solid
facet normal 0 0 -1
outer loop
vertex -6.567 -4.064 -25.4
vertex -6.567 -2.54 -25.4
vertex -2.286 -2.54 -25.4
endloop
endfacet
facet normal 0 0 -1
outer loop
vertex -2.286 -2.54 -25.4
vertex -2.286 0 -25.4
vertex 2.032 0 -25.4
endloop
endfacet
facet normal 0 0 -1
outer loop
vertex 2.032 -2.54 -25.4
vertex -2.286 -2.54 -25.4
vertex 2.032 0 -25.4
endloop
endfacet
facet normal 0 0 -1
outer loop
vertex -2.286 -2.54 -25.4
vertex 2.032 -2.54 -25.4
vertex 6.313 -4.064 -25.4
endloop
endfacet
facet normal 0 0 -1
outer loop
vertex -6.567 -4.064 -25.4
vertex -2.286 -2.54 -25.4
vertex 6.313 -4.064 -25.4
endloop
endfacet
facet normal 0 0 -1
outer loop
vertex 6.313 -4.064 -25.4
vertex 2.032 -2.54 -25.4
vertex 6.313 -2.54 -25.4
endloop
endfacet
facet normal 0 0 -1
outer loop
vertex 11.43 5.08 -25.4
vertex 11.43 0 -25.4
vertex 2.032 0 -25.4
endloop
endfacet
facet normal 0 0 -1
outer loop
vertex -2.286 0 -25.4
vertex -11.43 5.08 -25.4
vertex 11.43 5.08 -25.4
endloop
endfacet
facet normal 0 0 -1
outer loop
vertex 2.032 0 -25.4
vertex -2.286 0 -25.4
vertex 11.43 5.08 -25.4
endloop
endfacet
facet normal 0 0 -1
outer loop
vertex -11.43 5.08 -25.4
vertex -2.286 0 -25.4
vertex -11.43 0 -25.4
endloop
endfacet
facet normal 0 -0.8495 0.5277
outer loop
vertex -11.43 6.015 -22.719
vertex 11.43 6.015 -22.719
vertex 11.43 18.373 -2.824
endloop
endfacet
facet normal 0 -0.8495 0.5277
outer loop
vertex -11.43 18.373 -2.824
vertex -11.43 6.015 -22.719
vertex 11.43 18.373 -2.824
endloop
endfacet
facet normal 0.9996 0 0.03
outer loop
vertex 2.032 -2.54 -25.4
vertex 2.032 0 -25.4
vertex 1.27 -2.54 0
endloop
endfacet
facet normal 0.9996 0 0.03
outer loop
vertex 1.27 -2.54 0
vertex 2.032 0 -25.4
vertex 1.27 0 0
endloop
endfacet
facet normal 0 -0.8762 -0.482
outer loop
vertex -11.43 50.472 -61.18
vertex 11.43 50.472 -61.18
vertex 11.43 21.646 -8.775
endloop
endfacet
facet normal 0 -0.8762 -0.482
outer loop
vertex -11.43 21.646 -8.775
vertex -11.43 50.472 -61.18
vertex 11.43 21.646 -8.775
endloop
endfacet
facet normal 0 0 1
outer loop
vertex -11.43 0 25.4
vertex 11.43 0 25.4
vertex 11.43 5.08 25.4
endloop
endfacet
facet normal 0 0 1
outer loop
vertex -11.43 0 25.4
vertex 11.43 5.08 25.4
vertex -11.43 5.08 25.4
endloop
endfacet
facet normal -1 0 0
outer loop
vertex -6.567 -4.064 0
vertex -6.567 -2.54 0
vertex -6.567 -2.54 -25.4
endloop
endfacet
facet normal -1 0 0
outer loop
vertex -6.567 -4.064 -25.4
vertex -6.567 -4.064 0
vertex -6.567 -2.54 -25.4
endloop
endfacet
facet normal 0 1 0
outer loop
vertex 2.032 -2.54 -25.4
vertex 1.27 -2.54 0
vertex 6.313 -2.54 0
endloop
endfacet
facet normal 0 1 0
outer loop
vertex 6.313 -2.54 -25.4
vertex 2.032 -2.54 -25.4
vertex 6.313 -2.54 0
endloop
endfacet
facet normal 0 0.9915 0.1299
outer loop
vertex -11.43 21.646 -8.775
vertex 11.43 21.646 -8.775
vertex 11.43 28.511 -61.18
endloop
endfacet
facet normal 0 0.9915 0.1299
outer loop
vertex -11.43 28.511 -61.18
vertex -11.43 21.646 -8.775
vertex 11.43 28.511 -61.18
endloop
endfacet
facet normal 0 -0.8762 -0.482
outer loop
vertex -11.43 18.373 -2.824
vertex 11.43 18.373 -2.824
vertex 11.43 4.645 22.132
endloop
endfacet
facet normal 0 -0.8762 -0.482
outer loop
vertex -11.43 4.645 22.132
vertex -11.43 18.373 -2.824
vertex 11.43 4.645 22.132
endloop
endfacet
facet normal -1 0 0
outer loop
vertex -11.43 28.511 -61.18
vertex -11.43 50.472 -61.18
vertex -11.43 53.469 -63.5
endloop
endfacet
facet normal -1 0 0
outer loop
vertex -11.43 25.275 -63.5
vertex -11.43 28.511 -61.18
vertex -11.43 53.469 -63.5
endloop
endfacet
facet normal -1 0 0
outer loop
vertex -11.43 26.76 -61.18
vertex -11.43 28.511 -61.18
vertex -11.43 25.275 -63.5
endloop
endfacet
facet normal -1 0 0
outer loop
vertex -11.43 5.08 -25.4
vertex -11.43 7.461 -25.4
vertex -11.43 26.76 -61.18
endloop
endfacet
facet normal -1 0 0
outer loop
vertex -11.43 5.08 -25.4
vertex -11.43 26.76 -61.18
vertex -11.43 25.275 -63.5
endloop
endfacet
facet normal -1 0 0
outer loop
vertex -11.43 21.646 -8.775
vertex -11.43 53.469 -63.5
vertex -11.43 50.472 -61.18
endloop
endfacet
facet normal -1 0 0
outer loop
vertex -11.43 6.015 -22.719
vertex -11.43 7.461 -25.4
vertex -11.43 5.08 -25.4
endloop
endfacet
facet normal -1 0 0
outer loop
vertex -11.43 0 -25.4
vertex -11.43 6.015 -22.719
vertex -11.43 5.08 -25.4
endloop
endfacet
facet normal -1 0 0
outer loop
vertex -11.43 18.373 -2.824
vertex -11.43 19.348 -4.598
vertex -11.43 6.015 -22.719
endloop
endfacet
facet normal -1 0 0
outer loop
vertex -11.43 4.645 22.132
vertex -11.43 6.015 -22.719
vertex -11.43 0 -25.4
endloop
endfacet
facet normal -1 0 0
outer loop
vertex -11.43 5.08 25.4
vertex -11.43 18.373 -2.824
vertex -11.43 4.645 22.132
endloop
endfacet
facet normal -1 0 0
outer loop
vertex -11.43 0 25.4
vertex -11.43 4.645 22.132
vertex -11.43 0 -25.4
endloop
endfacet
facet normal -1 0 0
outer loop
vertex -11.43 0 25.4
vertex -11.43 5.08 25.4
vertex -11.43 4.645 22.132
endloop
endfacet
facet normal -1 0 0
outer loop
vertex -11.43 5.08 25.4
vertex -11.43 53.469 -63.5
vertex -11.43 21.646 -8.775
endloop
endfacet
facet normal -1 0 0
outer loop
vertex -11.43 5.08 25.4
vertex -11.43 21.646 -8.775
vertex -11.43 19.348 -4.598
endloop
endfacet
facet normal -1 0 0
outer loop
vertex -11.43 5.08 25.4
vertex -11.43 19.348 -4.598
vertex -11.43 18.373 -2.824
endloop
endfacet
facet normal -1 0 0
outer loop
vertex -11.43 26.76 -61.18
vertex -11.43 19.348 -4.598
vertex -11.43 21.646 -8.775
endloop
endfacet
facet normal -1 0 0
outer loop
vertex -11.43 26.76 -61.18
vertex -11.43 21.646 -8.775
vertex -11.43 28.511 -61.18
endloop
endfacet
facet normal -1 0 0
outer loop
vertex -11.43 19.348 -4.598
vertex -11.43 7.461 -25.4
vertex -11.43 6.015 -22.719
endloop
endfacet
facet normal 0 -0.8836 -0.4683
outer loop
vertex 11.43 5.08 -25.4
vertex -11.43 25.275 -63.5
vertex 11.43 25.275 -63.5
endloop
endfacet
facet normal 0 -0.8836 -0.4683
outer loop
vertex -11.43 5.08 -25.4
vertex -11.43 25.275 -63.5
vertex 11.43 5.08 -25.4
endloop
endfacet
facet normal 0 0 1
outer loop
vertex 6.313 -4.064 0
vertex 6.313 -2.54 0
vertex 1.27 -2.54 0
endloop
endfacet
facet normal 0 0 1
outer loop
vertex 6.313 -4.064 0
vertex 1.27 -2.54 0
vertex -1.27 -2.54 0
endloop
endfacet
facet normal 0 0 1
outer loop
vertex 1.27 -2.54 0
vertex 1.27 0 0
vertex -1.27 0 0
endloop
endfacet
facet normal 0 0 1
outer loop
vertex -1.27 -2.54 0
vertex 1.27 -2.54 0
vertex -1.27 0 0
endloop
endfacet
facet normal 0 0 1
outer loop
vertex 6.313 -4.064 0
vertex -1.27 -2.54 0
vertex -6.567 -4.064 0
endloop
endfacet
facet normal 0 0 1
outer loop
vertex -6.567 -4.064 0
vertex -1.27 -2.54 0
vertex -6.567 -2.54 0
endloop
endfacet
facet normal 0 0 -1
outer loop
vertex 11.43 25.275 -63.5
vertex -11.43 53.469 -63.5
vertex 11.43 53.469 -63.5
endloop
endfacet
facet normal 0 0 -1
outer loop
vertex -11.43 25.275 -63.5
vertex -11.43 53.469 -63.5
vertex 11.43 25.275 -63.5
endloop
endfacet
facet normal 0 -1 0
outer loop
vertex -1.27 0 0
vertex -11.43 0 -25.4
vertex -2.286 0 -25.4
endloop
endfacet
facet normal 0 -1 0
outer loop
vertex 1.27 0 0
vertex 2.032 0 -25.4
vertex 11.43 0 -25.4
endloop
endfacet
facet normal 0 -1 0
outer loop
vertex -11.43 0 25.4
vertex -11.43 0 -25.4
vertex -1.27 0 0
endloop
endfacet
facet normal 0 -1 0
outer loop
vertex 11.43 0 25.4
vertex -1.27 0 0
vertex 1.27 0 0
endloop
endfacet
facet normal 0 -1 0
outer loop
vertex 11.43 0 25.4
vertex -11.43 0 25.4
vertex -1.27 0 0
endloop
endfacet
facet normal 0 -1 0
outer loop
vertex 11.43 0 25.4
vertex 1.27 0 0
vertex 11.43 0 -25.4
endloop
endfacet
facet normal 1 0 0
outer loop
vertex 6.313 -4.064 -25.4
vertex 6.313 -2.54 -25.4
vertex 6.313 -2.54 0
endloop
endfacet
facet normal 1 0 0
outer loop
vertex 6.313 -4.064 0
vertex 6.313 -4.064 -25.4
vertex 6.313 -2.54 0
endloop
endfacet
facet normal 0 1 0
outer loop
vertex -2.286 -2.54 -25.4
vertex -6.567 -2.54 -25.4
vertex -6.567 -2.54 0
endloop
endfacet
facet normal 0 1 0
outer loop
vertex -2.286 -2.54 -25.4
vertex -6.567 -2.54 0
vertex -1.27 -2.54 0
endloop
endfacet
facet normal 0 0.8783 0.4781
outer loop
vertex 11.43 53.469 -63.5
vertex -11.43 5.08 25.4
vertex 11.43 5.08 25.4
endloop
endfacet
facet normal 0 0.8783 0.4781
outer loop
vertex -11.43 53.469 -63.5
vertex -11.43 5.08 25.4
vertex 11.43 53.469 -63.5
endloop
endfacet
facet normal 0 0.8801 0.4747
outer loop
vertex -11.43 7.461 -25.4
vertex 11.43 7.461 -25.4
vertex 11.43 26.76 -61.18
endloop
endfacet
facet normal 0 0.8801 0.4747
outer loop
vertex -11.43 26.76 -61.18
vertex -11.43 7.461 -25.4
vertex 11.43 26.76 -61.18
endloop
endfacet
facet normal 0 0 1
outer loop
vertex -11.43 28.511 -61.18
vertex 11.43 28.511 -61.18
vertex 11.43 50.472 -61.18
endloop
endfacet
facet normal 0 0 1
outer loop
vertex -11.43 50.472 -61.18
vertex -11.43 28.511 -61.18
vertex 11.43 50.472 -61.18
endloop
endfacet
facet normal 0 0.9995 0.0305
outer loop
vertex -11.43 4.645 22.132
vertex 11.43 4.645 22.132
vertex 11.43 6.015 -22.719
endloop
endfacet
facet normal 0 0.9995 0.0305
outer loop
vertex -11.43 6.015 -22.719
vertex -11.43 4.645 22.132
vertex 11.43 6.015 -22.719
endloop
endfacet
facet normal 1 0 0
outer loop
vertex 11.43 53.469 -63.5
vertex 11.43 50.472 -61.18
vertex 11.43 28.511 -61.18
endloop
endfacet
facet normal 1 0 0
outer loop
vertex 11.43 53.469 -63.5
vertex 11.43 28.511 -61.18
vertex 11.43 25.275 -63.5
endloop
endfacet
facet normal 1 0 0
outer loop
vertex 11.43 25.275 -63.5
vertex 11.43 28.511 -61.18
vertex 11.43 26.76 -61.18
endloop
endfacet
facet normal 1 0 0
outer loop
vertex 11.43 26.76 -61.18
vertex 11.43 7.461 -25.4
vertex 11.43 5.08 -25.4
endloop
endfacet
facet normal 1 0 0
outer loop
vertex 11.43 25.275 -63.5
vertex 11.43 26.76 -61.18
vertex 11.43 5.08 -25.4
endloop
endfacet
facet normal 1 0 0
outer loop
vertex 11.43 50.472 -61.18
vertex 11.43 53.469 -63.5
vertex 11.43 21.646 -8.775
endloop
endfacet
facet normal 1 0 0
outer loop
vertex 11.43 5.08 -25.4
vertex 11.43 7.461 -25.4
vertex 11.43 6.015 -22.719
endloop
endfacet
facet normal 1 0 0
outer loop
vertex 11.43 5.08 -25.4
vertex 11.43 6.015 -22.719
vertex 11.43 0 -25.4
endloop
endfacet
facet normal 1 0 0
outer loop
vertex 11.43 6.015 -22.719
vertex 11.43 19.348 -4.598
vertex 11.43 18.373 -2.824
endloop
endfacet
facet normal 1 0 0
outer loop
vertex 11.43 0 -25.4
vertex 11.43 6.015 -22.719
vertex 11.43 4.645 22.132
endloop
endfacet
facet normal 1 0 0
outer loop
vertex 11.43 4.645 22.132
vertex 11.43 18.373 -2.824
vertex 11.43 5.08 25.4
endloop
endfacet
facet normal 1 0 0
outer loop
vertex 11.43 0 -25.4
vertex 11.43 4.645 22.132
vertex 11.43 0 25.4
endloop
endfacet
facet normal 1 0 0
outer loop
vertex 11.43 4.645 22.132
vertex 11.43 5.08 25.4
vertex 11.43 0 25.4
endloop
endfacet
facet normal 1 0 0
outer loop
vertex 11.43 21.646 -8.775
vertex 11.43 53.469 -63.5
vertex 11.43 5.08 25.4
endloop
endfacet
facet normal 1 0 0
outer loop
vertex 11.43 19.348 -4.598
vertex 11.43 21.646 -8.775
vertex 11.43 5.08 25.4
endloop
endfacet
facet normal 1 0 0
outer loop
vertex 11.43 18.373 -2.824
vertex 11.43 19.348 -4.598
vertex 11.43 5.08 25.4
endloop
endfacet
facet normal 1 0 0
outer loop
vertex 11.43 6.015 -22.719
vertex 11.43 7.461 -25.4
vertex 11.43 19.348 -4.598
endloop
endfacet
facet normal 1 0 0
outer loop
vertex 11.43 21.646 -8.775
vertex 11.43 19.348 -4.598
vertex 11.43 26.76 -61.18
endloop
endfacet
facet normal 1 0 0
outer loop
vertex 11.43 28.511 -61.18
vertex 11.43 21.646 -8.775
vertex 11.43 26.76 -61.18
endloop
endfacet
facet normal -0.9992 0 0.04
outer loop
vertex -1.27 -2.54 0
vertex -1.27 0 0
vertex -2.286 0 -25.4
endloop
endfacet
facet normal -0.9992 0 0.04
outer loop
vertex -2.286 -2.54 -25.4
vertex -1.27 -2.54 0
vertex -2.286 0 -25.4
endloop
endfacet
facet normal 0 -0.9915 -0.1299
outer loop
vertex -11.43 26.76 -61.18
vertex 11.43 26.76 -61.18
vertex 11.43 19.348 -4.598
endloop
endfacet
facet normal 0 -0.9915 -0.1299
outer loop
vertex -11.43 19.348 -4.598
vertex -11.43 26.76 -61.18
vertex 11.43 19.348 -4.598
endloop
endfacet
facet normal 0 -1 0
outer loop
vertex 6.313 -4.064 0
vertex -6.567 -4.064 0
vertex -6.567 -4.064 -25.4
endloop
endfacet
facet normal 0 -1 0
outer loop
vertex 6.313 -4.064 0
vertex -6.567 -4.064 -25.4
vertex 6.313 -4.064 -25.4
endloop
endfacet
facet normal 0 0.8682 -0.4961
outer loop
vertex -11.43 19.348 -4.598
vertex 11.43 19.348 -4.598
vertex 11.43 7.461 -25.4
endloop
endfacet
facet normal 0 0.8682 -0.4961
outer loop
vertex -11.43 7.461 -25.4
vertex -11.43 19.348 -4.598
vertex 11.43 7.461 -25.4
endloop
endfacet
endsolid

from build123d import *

# Parameters (mm, degrees)
F1_DEPTH = 5.08
F2_DEPTH = 2.54
F4_DEPTH = 1.524
F6_DEPTH = 22.86
F8_DEPTH = 25.4


with BuildPart() as f1:
    # F0 (on Front) → F1 (new body)
    with BuildSketch(Plane.XZ):
        Polygon((11.43, 25.4), (-11.43, 25.4), (-11.43, -25.4), (-6.35, -25.4), (-6.35, 0), (-1.27, 0), (1.27, 0), (6.35, 0), (6.35, -25.4), (11.43, -25.4), align=None)
        Polygon((-6.35, 0), (-6.35, -25.4), (-2.286, -25.4), (-1.27, 0), align=None)
        Polygon((-1.27, 0), (-2.286, -25.4), (2.032, -25.4), (1.27, 0), align=None)
        Polygon((2.032, -25.4), (6.35, -25.4), (6.35, 0), (1.27, 0), align=None)
    extrude(amount=-F1_DEPTH)

    # F0 (on Front) → F2 (join)
    with BuildSketch(Plane.XZ):
        Polygon((-1.27, 0), (-2.286, -25.4), (2.032, -25.4), (1.27, 0), align=None)
    extrude(amount=F2_DEPTH)

    # F3 (on face) → F4 (join)
    with BuildSketch(Plane.XZ.offset(2.54)):
        Polygon((6.313071, 0), (1.27, 0), (2.032, -25.4), (6.313071, -25.4), align=None)
        Polygon((1.27, 0), (-1.27, 0), (-2.286, -25.4), (2.032, -25.4), align=None)
        Polygon((-1.27, 0), (-6.567071, 0), (-6.567071, -25.4), (-2.286, -25.4), align=None)
    extrude(amount=F4_DEPTH)

    # F5 (on face) → F6 (join, through all)
    with BuildSketch(Plane(origin=(-11.43, 0, 0), x_dir=(0, -1, 0), z_dir=(-1, 0, 0))):
        Polygon((-5.08, -25.4), (-5.08, 25.4), (-53.4693, -63.5), (-25.275299, -63.5), align=None)
    extrude(amount=-F6_DEPTH)

    # F7 (on face) → F8 (cut)
    with BuildSketch(Plane.YZ.offset(11.43)):
        Polygon((18.372589, -2.824009), (4.645219, 22.132182), (6.014857, -22.718789), align=None)
        Polygon((7.461059, -25.4), (26.760479, -61.180491), (19.348416, -4.59805), align=None)
        Polygon((28.510716, -61.180491), (50.472081, -61.180491), (21.645763, -8.774598), align=None)
    extrude(amount=-F8_DEPTH, mode=Mode.SUBTRACT)


solid = f1.part
